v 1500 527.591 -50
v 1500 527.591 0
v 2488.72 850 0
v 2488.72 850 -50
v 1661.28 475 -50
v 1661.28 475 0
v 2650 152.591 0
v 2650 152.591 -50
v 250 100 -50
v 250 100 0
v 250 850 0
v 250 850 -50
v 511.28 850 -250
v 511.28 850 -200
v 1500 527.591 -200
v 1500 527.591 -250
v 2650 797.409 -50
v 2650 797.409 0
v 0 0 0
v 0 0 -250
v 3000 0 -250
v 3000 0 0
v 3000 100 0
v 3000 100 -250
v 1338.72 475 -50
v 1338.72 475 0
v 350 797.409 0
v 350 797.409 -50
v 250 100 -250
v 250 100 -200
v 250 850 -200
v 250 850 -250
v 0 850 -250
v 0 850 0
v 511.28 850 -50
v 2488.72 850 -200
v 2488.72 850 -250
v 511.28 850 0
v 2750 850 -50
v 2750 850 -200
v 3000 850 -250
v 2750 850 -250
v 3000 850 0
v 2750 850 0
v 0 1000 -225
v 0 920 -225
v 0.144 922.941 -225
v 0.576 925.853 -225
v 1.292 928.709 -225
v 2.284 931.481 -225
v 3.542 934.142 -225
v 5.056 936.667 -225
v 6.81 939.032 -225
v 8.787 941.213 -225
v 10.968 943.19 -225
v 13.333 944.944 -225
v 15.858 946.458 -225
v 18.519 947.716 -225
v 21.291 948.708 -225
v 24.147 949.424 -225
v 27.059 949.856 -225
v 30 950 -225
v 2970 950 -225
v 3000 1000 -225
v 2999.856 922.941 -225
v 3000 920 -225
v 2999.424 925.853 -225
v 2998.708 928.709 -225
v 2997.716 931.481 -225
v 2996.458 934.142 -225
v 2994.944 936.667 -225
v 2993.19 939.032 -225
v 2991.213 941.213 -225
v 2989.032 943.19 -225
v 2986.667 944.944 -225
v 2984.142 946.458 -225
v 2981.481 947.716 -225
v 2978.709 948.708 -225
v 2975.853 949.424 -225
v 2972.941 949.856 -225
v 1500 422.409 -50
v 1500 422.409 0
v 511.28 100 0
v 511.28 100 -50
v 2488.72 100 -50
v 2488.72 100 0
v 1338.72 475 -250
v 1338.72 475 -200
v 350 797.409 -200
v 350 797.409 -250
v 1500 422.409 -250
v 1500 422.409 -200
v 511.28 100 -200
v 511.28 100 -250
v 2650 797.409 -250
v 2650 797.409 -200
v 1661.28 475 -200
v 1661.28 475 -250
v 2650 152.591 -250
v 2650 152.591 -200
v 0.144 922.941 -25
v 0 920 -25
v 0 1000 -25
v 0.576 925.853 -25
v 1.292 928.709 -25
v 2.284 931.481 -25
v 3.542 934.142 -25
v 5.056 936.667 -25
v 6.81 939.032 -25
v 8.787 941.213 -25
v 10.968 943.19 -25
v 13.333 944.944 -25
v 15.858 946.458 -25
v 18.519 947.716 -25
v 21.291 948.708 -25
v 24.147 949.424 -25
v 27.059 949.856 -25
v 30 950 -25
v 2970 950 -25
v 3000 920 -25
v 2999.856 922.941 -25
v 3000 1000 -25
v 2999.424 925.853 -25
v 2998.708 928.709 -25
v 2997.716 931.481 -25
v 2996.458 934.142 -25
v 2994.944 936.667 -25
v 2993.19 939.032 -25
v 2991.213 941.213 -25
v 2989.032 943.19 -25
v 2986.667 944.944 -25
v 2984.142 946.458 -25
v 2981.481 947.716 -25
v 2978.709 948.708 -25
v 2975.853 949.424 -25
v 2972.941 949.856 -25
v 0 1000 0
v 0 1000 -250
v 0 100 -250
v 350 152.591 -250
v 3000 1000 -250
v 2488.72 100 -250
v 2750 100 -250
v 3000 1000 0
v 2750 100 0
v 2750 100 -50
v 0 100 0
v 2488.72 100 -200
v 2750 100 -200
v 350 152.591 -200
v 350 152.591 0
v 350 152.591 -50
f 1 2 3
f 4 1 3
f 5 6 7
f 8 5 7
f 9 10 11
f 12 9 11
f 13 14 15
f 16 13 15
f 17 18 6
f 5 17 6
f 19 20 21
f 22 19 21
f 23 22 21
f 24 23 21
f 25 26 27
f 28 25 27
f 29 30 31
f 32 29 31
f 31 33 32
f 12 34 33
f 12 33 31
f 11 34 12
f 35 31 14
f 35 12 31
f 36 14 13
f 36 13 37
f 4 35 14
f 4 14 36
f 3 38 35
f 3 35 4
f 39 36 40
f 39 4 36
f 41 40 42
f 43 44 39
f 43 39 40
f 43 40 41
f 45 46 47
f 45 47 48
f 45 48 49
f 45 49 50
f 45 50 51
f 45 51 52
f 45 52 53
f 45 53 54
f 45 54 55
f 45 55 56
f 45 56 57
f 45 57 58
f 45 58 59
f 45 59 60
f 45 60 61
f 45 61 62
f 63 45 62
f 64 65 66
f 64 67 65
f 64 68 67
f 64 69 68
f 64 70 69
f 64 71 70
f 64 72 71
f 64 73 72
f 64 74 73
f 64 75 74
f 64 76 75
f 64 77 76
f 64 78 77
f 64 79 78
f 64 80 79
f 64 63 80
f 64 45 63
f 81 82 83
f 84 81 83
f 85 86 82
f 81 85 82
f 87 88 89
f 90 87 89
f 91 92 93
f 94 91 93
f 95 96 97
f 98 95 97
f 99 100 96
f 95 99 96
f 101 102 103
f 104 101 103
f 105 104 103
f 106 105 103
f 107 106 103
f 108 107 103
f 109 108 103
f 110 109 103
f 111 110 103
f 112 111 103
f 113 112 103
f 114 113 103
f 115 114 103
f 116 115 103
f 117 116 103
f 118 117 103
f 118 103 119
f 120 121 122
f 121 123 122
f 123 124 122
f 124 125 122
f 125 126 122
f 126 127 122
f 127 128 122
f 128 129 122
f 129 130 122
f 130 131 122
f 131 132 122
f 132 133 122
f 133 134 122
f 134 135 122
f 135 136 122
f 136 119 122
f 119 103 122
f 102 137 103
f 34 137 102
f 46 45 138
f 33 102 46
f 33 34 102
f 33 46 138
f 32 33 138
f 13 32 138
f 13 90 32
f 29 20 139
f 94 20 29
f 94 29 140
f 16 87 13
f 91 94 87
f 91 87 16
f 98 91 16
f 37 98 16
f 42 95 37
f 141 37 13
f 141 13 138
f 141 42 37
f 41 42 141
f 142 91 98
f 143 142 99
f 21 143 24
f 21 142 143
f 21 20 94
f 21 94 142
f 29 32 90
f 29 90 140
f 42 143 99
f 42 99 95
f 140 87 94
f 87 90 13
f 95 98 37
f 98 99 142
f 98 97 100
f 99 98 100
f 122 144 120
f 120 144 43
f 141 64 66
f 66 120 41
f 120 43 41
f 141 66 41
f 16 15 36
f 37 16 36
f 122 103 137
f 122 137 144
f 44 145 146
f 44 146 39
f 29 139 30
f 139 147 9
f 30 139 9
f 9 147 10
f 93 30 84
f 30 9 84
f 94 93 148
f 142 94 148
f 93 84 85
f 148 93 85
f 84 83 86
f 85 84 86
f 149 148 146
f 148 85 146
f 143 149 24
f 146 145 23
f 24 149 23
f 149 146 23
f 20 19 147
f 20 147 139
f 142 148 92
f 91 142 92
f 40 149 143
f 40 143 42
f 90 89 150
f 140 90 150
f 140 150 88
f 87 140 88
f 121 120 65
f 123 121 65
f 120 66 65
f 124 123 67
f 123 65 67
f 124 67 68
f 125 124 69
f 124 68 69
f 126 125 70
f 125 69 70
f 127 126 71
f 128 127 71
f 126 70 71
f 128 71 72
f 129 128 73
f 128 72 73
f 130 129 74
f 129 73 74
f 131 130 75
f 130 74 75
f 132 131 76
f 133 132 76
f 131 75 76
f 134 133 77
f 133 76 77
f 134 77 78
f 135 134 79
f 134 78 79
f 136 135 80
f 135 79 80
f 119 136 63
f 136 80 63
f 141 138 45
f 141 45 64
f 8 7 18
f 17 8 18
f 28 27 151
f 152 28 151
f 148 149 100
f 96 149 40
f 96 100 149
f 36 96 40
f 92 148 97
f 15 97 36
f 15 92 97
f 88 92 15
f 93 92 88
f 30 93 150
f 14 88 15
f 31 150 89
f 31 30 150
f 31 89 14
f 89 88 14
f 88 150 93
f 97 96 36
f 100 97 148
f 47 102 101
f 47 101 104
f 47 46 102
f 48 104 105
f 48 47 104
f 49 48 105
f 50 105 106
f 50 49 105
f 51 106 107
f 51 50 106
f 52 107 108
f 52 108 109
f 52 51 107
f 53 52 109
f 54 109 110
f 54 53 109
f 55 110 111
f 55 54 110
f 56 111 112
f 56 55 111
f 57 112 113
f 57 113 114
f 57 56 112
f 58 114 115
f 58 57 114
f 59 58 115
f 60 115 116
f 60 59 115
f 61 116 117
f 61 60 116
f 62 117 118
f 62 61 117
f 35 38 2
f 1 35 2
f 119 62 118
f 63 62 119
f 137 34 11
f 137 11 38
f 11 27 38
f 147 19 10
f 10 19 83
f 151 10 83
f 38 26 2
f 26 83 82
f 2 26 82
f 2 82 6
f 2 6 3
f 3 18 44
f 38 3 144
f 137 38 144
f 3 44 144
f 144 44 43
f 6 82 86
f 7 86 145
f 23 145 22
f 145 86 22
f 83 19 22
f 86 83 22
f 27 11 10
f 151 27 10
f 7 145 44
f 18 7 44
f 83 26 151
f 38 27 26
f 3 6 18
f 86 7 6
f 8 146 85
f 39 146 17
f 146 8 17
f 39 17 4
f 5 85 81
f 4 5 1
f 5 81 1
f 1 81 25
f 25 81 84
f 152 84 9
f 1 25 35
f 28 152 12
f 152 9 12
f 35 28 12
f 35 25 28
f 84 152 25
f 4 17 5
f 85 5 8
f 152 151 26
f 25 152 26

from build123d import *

# Parameters (mm, degrees)
ESBO_O1_W                = 3000
ESBO_O1_H                = 250
RESSALTO_EXTRUS_O1_DEPTH = 1000
ESBO_O2_W                = 250
ESBO_O2_H                = 750
CORTE_EXTRUS_O1_DEPTH    = 250
CORTE_EXTRUS_O2_REACH    = 2938.835
ESBO_O3_W                = 150
ESBO_O3_H                = 750
ESBO_O4_W                = 3000
ESBO_O4_H                = 200
CORTE_EXTRUS_O3_DEPTH    = 50
FILETE1_R                = 30


with BuildPart() as part:
    # Esboço1 → Ressalto-extrusão1 (new body)
    with BuildSketch(Plane(origin=(0, 0, 0), x_dir=(1, 0, 0), z_dir=(0, 1, 0))):
        with Locations((1500, 125)):
            Rectangle(ESBO_O1_W, ESBO_O1_H)
    extrude(amount=RESSALTO_EXTRUS_O1_DEPTH)

    # Esboço2 → Corte-extrusão1 (cut)
    with BuildSketch(Plane.XY):
        with Locations((125, 475)):
            Rectangle(ESBO_O2_W, ESBO_O2_H)
        Polygon((1338.720394621, 475), (350, 797.408824333), (350, 152.591175667), align=None)
        Polygon((2488.720394621, 850), (511.279605379, 850), (1500, 527.591175667), align=None)
        Polygon((2488.720394621, 100), (1500, 422.408824333), (511.279605379, 100), align=None)
        Polygon((2650, 797.408824333), (1661.279605379, 475), (2650, 152.591175667), align=None)
        with Locations((2875, 475)):
            Rectangle(ESBO_O2_W, ESBO_O2_H)
    extrude(amount=-CORTE_EXTRUS_O1_DEPTH, mode=Mode.SUBTRACT)

    # Corte-extrusão2: up to this face of the body (flat: up to its plane)
    corte_extrus_o2_end = Plane(part.part.faces().sort_by_distance((2750, 475, -125))[0])
    # Esboço3 → Corte-extrusão2 (cut, up to the picked face)
    with BuildSketch(Plane.ZY.offset(-250), mode=Mode.PRIVATE) as corte_extrus_o2_sk1:
        with Locations((-125, 475)):
            Rectangle(ESBO_O3_W, ESBO_O3_H)
    corte_extrus_o2_tool1 = split(extrude(corte_extrus_o2_sk1.sketch, amount=-CORTE_EXTRUS_O2_REACH, mode=Mode.PRIVATE), bisect_by=corte_extrus_o2_end, keep=Keep.BOTH, mode=Mode.PRIVATE)
    add(corte_extrus_o2_tool1.solids().sort_by(Axis((250, 475, -125), (1, 0, 0)))[0], mode=Mode.SUBTRACT)

    # Esboço4 → Corte-extrusão3 (cut)
    with BuildSketch(Plane(origin=(0, 1000, 0), x_dir=(1, 0, 0), z_dir=(0, 1, 0))):
        with Locations((1500, 125)):
            Rectangle(ESBO_O4_W, ESBO_O4_H)
    extrude(amount=-CORTE_EXTRUS_O3_DEPTH, mode=Mode.SUBTRACT)

    # Filete1
    filete1_edges = [part.edges().sort_by_distance(p)[0] for p in [
        (3000, 950, -125),
        (0, 950, -125),
    ]]
    fillet(filete1_edges, radius=FILETE1_R)


solid = part.part
